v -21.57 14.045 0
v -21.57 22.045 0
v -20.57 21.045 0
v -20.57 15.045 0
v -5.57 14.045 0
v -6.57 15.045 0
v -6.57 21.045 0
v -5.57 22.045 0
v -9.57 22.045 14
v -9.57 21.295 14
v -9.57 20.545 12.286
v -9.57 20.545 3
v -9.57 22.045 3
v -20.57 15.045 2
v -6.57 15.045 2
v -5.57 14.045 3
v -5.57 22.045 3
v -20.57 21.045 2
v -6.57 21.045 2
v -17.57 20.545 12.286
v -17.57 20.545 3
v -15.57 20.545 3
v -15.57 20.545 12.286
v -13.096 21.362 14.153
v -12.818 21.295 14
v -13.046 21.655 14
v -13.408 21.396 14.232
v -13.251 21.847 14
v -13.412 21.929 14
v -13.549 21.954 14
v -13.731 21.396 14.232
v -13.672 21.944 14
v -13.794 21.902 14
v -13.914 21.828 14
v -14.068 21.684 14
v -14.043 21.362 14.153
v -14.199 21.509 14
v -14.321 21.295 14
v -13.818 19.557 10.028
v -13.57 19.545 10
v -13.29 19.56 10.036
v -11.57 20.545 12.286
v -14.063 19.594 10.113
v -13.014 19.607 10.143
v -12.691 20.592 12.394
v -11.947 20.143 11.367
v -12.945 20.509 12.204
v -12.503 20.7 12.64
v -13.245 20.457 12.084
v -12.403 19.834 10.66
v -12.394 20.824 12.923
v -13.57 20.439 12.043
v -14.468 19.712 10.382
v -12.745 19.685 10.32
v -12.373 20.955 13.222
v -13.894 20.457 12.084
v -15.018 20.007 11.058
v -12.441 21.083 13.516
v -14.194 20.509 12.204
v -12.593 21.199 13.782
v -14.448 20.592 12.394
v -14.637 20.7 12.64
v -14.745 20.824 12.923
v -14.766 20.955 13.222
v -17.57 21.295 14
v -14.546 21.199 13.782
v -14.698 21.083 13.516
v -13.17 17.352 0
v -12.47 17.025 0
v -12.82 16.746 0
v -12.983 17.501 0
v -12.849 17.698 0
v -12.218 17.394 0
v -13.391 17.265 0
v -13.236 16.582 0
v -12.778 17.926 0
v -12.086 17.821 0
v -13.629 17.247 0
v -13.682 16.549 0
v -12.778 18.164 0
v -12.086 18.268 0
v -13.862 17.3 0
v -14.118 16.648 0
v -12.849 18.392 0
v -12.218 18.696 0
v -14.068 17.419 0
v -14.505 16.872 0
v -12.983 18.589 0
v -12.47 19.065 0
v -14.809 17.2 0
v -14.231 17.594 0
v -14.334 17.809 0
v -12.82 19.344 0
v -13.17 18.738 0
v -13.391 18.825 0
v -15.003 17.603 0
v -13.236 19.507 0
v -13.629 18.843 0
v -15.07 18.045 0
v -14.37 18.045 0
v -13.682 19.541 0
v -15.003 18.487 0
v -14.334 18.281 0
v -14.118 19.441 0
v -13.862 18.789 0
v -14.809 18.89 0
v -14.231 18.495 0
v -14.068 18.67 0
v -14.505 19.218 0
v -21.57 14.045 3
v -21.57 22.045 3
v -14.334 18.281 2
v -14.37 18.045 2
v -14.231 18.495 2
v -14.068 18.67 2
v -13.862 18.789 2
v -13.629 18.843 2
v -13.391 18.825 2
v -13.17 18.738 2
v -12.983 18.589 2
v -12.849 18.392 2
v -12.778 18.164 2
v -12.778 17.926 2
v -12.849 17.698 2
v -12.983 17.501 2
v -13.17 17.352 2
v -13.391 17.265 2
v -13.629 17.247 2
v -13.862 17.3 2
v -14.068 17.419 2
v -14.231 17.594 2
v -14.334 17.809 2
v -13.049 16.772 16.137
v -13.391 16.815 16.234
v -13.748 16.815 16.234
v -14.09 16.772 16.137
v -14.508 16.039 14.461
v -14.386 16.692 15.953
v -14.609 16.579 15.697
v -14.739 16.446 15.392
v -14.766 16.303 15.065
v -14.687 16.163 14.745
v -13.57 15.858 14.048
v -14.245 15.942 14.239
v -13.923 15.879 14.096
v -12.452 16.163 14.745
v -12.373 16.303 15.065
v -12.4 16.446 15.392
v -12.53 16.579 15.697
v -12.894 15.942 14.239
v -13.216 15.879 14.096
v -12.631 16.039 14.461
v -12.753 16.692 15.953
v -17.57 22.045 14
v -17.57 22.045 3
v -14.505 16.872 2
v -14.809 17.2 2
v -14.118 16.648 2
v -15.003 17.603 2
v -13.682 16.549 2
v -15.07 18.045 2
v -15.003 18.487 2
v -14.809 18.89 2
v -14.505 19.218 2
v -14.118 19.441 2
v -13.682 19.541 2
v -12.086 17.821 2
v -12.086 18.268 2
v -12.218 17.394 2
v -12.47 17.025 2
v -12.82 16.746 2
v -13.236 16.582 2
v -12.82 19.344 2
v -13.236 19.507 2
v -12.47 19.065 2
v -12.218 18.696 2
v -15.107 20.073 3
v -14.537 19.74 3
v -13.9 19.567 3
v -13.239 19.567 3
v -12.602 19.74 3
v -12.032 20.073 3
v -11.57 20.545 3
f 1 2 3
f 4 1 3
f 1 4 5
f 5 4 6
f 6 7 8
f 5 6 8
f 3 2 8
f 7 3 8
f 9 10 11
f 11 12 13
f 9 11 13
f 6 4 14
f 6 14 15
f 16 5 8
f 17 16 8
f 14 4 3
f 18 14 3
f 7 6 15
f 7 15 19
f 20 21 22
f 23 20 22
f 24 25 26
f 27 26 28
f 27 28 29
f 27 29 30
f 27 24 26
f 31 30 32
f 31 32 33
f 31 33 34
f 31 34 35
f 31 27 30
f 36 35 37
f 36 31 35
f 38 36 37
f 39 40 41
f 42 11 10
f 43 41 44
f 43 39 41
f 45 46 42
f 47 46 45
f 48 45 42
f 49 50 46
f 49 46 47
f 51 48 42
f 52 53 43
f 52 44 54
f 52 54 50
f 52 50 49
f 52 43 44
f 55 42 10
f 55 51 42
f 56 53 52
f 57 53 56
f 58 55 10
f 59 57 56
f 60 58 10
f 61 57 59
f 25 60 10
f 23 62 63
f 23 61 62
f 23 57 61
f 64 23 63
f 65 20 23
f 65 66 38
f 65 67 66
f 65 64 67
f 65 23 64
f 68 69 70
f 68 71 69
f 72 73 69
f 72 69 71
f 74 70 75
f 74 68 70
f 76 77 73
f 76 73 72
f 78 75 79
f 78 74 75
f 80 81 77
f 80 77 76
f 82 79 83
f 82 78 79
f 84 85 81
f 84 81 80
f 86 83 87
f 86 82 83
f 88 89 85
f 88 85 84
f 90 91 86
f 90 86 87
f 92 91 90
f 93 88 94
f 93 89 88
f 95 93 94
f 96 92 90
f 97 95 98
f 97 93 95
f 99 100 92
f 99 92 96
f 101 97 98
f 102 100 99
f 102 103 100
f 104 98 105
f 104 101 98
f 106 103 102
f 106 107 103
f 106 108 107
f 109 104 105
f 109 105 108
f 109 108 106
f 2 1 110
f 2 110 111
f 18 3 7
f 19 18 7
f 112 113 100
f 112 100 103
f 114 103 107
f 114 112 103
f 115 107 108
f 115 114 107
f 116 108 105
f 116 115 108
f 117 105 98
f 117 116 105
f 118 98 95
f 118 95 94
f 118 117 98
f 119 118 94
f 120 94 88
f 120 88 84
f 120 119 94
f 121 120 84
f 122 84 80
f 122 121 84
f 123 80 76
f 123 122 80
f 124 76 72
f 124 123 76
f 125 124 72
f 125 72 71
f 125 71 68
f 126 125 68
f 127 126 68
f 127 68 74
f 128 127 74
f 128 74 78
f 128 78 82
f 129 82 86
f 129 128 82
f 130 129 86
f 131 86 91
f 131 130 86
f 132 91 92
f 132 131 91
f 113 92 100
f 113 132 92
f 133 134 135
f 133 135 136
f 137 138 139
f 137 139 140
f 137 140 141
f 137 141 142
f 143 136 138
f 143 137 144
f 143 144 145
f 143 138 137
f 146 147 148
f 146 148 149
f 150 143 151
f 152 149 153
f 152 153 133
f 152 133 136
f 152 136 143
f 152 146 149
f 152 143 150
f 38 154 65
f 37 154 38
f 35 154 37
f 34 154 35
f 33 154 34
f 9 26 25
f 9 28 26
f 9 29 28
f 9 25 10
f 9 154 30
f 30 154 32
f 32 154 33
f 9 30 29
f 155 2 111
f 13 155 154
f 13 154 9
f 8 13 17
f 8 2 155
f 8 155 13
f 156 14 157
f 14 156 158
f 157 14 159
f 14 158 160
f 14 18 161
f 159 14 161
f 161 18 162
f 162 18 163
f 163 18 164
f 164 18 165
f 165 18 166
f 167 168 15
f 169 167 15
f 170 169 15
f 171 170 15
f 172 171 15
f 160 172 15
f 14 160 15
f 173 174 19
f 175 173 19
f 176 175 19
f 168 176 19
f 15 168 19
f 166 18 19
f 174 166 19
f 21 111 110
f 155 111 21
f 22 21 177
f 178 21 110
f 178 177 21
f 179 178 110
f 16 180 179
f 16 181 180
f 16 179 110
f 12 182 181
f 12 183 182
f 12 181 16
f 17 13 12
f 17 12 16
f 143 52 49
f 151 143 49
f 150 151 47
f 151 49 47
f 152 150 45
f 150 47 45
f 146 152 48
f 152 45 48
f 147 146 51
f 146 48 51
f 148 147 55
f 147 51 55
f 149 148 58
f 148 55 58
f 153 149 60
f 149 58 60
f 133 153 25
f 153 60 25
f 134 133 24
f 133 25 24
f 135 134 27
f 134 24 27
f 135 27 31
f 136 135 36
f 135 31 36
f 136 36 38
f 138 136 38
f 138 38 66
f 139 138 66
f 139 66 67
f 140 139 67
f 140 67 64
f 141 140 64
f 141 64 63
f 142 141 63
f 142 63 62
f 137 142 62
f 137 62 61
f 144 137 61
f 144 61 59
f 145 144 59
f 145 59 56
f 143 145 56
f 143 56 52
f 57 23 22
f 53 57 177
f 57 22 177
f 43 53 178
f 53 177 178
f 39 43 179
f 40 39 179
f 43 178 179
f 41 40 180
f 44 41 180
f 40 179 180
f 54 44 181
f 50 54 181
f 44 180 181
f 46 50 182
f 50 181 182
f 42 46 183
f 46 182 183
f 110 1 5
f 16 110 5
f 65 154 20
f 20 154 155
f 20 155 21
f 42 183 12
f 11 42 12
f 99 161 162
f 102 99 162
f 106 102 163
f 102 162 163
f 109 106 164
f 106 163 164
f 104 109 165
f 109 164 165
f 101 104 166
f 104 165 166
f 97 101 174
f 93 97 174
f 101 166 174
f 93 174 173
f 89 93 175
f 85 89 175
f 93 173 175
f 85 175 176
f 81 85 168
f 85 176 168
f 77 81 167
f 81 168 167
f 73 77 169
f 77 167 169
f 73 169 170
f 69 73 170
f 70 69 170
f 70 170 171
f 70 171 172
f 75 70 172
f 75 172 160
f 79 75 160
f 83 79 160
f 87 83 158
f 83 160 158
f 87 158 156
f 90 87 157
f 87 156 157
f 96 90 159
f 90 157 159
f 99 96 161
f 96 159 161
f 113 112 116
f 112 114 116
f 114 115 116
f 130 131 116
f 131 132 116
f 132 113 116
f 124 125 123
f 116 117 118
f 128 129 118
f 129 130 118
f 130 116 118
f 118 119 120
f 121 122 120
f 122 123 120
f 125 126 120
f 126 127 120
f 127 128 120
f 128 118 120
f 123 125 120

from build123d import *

# Parameters (mm, degrees)
SKETCH1_W                       = 16
SKETCH1_H                       = 8
BOSS_EXTRUDE1_DEPTH             = 3
SHELL3_T                        = -1
SKETCH2_R                       = 1.5
SKETCH2_R_2                     = 0.8
BOSS_EXTRUDE2_DEPTH             = 2
BOSS_EXTRUDE3_DEPTH             = 11
CUT_EXTRUDE2_DEPTH              = 10
SKETCH5_R                       = 1.2
BOSS_EXTRUDE4_DEPTH             = 5
BOSS_EXTRUDE4_DIRECTION_2_REACH = 32.577


with BuildPart() as part:
    # Sketch1 → Boss-Extrude1 (new body)
    with BuildSketch(Plane.XY):
        with Locations((-13.569515058, 18.04477027)):
            Rectangle(SKETCH1_W, SKETCH1_H)
    extrude(amount=BOSS_EXTRUDE1_DEPTH)

    # Shell3
    shell3_openings = [part.faces().sort_by_distance(p)[0] for p in [
        (-13.569515058, 18.04477027, 0),
    ]]
    offset(amount=SHELL3_T, openings=shell3_openings, kind=Kind.INTERSECTION)

    # Sketch2 → Boss-Extrude2 (add)
    with BuildSketch(Plane(origin=(0, 0, 2), x_dir=(-1, 0, 0), z_dir=(0, 0, -1))):
        with Locations((13.569515058, 18.04477027)):
            Circle(SKETCH2_R)
        with Locations((13.569515058, 18.04477027)):
            Circle(SKETCH2_R_2, mode=Mode.SUBTRACT)
    extrude(amount=BOSS_EXTRUDE2_DEPTH)

    # Sketch3 → Boss-Extrude3 (add)
    with BuildSketch(Plane.XY.offset(3)):
        with BuildLine():
            Line((-17.569515058, 22.04477027), (-17.569515058, 20.54477027))
            Line((-17.569515058, 20.54477027), (-15.569515058, 20.54477027))
            ThreePointArc((-15.569515058, 20.54477027), (-13.569515058, 19.54477027), (-11.569515058, 20.54477027))
            Line((-11.569515058, 20.54477027), (-9.569515058, 20.54477027))
            Line((-9.569515058, 20.54477027), (-9.569515058, 22.04477027))
            Line((-9.569515058, 22.04477027), (-17.569515058, 22.04477027))
        make_face()
    extrude(amount=BOSS_EXTRUDE3_DEPTH)

    # Sketch4 → Cut-Extrude2 (cut)
    with BuildSketch(Plane.ZY.offset(17.569515058)):
        Polygon((14, 21.29477027), (14, 19.54477027), (10, 19.54477027), align=None)
    extrude(amount=-CUT_EXTRUDE2_DEPTH, mode=Mode.SUBTRACT)

    # Sketch5 → Boss-Extrude4 (add)
    with BuildSketch(Plane(origin=(0, 12.732659637, -5.570538591), x_dir=(-1, 0, 0), z_dir=(0, -0.9161573349021893, 0.4008188340197074))):
        with Locations(Location((13.569515058, -20.425962901, 0), (0, 0, 90))):
            Circle(SKETCH5_R)
    extrude(amount=BOSS_EXTRUDE4_DEPTH)

    # Sketch5 → Boss-Extrude4 direction 2 (add, up to next)
    with BuildSketch(Plane(origin=(0, 12.732659637, -5.570538591), x_dir=(-1, 0, 0), z_dir=(0, -0.9161573349021893, 0.4008188340197074)), mode=Mode.PRIVATE) as boss_extrude4_direction_2_sk1:
        with Locations(Location((13.569515058, -20.425962901, 0), (0, 0, 90))):
            Circle(SKETCH5_R)
    boss_extrude4_direction_2_tool1 = extrude(boss_extrude4_direction_2_sk1.sketch, amount=-BOSS_EXTRUDE4_DIRECTION_2_REACH, mode=Mode.PRIVATE) - part.part
    add(boss_extrude4_direction_2_tool1.solids().sort_by_distance((-13.569515, 20.91977, 13.142857))[0])


solid = part.part
